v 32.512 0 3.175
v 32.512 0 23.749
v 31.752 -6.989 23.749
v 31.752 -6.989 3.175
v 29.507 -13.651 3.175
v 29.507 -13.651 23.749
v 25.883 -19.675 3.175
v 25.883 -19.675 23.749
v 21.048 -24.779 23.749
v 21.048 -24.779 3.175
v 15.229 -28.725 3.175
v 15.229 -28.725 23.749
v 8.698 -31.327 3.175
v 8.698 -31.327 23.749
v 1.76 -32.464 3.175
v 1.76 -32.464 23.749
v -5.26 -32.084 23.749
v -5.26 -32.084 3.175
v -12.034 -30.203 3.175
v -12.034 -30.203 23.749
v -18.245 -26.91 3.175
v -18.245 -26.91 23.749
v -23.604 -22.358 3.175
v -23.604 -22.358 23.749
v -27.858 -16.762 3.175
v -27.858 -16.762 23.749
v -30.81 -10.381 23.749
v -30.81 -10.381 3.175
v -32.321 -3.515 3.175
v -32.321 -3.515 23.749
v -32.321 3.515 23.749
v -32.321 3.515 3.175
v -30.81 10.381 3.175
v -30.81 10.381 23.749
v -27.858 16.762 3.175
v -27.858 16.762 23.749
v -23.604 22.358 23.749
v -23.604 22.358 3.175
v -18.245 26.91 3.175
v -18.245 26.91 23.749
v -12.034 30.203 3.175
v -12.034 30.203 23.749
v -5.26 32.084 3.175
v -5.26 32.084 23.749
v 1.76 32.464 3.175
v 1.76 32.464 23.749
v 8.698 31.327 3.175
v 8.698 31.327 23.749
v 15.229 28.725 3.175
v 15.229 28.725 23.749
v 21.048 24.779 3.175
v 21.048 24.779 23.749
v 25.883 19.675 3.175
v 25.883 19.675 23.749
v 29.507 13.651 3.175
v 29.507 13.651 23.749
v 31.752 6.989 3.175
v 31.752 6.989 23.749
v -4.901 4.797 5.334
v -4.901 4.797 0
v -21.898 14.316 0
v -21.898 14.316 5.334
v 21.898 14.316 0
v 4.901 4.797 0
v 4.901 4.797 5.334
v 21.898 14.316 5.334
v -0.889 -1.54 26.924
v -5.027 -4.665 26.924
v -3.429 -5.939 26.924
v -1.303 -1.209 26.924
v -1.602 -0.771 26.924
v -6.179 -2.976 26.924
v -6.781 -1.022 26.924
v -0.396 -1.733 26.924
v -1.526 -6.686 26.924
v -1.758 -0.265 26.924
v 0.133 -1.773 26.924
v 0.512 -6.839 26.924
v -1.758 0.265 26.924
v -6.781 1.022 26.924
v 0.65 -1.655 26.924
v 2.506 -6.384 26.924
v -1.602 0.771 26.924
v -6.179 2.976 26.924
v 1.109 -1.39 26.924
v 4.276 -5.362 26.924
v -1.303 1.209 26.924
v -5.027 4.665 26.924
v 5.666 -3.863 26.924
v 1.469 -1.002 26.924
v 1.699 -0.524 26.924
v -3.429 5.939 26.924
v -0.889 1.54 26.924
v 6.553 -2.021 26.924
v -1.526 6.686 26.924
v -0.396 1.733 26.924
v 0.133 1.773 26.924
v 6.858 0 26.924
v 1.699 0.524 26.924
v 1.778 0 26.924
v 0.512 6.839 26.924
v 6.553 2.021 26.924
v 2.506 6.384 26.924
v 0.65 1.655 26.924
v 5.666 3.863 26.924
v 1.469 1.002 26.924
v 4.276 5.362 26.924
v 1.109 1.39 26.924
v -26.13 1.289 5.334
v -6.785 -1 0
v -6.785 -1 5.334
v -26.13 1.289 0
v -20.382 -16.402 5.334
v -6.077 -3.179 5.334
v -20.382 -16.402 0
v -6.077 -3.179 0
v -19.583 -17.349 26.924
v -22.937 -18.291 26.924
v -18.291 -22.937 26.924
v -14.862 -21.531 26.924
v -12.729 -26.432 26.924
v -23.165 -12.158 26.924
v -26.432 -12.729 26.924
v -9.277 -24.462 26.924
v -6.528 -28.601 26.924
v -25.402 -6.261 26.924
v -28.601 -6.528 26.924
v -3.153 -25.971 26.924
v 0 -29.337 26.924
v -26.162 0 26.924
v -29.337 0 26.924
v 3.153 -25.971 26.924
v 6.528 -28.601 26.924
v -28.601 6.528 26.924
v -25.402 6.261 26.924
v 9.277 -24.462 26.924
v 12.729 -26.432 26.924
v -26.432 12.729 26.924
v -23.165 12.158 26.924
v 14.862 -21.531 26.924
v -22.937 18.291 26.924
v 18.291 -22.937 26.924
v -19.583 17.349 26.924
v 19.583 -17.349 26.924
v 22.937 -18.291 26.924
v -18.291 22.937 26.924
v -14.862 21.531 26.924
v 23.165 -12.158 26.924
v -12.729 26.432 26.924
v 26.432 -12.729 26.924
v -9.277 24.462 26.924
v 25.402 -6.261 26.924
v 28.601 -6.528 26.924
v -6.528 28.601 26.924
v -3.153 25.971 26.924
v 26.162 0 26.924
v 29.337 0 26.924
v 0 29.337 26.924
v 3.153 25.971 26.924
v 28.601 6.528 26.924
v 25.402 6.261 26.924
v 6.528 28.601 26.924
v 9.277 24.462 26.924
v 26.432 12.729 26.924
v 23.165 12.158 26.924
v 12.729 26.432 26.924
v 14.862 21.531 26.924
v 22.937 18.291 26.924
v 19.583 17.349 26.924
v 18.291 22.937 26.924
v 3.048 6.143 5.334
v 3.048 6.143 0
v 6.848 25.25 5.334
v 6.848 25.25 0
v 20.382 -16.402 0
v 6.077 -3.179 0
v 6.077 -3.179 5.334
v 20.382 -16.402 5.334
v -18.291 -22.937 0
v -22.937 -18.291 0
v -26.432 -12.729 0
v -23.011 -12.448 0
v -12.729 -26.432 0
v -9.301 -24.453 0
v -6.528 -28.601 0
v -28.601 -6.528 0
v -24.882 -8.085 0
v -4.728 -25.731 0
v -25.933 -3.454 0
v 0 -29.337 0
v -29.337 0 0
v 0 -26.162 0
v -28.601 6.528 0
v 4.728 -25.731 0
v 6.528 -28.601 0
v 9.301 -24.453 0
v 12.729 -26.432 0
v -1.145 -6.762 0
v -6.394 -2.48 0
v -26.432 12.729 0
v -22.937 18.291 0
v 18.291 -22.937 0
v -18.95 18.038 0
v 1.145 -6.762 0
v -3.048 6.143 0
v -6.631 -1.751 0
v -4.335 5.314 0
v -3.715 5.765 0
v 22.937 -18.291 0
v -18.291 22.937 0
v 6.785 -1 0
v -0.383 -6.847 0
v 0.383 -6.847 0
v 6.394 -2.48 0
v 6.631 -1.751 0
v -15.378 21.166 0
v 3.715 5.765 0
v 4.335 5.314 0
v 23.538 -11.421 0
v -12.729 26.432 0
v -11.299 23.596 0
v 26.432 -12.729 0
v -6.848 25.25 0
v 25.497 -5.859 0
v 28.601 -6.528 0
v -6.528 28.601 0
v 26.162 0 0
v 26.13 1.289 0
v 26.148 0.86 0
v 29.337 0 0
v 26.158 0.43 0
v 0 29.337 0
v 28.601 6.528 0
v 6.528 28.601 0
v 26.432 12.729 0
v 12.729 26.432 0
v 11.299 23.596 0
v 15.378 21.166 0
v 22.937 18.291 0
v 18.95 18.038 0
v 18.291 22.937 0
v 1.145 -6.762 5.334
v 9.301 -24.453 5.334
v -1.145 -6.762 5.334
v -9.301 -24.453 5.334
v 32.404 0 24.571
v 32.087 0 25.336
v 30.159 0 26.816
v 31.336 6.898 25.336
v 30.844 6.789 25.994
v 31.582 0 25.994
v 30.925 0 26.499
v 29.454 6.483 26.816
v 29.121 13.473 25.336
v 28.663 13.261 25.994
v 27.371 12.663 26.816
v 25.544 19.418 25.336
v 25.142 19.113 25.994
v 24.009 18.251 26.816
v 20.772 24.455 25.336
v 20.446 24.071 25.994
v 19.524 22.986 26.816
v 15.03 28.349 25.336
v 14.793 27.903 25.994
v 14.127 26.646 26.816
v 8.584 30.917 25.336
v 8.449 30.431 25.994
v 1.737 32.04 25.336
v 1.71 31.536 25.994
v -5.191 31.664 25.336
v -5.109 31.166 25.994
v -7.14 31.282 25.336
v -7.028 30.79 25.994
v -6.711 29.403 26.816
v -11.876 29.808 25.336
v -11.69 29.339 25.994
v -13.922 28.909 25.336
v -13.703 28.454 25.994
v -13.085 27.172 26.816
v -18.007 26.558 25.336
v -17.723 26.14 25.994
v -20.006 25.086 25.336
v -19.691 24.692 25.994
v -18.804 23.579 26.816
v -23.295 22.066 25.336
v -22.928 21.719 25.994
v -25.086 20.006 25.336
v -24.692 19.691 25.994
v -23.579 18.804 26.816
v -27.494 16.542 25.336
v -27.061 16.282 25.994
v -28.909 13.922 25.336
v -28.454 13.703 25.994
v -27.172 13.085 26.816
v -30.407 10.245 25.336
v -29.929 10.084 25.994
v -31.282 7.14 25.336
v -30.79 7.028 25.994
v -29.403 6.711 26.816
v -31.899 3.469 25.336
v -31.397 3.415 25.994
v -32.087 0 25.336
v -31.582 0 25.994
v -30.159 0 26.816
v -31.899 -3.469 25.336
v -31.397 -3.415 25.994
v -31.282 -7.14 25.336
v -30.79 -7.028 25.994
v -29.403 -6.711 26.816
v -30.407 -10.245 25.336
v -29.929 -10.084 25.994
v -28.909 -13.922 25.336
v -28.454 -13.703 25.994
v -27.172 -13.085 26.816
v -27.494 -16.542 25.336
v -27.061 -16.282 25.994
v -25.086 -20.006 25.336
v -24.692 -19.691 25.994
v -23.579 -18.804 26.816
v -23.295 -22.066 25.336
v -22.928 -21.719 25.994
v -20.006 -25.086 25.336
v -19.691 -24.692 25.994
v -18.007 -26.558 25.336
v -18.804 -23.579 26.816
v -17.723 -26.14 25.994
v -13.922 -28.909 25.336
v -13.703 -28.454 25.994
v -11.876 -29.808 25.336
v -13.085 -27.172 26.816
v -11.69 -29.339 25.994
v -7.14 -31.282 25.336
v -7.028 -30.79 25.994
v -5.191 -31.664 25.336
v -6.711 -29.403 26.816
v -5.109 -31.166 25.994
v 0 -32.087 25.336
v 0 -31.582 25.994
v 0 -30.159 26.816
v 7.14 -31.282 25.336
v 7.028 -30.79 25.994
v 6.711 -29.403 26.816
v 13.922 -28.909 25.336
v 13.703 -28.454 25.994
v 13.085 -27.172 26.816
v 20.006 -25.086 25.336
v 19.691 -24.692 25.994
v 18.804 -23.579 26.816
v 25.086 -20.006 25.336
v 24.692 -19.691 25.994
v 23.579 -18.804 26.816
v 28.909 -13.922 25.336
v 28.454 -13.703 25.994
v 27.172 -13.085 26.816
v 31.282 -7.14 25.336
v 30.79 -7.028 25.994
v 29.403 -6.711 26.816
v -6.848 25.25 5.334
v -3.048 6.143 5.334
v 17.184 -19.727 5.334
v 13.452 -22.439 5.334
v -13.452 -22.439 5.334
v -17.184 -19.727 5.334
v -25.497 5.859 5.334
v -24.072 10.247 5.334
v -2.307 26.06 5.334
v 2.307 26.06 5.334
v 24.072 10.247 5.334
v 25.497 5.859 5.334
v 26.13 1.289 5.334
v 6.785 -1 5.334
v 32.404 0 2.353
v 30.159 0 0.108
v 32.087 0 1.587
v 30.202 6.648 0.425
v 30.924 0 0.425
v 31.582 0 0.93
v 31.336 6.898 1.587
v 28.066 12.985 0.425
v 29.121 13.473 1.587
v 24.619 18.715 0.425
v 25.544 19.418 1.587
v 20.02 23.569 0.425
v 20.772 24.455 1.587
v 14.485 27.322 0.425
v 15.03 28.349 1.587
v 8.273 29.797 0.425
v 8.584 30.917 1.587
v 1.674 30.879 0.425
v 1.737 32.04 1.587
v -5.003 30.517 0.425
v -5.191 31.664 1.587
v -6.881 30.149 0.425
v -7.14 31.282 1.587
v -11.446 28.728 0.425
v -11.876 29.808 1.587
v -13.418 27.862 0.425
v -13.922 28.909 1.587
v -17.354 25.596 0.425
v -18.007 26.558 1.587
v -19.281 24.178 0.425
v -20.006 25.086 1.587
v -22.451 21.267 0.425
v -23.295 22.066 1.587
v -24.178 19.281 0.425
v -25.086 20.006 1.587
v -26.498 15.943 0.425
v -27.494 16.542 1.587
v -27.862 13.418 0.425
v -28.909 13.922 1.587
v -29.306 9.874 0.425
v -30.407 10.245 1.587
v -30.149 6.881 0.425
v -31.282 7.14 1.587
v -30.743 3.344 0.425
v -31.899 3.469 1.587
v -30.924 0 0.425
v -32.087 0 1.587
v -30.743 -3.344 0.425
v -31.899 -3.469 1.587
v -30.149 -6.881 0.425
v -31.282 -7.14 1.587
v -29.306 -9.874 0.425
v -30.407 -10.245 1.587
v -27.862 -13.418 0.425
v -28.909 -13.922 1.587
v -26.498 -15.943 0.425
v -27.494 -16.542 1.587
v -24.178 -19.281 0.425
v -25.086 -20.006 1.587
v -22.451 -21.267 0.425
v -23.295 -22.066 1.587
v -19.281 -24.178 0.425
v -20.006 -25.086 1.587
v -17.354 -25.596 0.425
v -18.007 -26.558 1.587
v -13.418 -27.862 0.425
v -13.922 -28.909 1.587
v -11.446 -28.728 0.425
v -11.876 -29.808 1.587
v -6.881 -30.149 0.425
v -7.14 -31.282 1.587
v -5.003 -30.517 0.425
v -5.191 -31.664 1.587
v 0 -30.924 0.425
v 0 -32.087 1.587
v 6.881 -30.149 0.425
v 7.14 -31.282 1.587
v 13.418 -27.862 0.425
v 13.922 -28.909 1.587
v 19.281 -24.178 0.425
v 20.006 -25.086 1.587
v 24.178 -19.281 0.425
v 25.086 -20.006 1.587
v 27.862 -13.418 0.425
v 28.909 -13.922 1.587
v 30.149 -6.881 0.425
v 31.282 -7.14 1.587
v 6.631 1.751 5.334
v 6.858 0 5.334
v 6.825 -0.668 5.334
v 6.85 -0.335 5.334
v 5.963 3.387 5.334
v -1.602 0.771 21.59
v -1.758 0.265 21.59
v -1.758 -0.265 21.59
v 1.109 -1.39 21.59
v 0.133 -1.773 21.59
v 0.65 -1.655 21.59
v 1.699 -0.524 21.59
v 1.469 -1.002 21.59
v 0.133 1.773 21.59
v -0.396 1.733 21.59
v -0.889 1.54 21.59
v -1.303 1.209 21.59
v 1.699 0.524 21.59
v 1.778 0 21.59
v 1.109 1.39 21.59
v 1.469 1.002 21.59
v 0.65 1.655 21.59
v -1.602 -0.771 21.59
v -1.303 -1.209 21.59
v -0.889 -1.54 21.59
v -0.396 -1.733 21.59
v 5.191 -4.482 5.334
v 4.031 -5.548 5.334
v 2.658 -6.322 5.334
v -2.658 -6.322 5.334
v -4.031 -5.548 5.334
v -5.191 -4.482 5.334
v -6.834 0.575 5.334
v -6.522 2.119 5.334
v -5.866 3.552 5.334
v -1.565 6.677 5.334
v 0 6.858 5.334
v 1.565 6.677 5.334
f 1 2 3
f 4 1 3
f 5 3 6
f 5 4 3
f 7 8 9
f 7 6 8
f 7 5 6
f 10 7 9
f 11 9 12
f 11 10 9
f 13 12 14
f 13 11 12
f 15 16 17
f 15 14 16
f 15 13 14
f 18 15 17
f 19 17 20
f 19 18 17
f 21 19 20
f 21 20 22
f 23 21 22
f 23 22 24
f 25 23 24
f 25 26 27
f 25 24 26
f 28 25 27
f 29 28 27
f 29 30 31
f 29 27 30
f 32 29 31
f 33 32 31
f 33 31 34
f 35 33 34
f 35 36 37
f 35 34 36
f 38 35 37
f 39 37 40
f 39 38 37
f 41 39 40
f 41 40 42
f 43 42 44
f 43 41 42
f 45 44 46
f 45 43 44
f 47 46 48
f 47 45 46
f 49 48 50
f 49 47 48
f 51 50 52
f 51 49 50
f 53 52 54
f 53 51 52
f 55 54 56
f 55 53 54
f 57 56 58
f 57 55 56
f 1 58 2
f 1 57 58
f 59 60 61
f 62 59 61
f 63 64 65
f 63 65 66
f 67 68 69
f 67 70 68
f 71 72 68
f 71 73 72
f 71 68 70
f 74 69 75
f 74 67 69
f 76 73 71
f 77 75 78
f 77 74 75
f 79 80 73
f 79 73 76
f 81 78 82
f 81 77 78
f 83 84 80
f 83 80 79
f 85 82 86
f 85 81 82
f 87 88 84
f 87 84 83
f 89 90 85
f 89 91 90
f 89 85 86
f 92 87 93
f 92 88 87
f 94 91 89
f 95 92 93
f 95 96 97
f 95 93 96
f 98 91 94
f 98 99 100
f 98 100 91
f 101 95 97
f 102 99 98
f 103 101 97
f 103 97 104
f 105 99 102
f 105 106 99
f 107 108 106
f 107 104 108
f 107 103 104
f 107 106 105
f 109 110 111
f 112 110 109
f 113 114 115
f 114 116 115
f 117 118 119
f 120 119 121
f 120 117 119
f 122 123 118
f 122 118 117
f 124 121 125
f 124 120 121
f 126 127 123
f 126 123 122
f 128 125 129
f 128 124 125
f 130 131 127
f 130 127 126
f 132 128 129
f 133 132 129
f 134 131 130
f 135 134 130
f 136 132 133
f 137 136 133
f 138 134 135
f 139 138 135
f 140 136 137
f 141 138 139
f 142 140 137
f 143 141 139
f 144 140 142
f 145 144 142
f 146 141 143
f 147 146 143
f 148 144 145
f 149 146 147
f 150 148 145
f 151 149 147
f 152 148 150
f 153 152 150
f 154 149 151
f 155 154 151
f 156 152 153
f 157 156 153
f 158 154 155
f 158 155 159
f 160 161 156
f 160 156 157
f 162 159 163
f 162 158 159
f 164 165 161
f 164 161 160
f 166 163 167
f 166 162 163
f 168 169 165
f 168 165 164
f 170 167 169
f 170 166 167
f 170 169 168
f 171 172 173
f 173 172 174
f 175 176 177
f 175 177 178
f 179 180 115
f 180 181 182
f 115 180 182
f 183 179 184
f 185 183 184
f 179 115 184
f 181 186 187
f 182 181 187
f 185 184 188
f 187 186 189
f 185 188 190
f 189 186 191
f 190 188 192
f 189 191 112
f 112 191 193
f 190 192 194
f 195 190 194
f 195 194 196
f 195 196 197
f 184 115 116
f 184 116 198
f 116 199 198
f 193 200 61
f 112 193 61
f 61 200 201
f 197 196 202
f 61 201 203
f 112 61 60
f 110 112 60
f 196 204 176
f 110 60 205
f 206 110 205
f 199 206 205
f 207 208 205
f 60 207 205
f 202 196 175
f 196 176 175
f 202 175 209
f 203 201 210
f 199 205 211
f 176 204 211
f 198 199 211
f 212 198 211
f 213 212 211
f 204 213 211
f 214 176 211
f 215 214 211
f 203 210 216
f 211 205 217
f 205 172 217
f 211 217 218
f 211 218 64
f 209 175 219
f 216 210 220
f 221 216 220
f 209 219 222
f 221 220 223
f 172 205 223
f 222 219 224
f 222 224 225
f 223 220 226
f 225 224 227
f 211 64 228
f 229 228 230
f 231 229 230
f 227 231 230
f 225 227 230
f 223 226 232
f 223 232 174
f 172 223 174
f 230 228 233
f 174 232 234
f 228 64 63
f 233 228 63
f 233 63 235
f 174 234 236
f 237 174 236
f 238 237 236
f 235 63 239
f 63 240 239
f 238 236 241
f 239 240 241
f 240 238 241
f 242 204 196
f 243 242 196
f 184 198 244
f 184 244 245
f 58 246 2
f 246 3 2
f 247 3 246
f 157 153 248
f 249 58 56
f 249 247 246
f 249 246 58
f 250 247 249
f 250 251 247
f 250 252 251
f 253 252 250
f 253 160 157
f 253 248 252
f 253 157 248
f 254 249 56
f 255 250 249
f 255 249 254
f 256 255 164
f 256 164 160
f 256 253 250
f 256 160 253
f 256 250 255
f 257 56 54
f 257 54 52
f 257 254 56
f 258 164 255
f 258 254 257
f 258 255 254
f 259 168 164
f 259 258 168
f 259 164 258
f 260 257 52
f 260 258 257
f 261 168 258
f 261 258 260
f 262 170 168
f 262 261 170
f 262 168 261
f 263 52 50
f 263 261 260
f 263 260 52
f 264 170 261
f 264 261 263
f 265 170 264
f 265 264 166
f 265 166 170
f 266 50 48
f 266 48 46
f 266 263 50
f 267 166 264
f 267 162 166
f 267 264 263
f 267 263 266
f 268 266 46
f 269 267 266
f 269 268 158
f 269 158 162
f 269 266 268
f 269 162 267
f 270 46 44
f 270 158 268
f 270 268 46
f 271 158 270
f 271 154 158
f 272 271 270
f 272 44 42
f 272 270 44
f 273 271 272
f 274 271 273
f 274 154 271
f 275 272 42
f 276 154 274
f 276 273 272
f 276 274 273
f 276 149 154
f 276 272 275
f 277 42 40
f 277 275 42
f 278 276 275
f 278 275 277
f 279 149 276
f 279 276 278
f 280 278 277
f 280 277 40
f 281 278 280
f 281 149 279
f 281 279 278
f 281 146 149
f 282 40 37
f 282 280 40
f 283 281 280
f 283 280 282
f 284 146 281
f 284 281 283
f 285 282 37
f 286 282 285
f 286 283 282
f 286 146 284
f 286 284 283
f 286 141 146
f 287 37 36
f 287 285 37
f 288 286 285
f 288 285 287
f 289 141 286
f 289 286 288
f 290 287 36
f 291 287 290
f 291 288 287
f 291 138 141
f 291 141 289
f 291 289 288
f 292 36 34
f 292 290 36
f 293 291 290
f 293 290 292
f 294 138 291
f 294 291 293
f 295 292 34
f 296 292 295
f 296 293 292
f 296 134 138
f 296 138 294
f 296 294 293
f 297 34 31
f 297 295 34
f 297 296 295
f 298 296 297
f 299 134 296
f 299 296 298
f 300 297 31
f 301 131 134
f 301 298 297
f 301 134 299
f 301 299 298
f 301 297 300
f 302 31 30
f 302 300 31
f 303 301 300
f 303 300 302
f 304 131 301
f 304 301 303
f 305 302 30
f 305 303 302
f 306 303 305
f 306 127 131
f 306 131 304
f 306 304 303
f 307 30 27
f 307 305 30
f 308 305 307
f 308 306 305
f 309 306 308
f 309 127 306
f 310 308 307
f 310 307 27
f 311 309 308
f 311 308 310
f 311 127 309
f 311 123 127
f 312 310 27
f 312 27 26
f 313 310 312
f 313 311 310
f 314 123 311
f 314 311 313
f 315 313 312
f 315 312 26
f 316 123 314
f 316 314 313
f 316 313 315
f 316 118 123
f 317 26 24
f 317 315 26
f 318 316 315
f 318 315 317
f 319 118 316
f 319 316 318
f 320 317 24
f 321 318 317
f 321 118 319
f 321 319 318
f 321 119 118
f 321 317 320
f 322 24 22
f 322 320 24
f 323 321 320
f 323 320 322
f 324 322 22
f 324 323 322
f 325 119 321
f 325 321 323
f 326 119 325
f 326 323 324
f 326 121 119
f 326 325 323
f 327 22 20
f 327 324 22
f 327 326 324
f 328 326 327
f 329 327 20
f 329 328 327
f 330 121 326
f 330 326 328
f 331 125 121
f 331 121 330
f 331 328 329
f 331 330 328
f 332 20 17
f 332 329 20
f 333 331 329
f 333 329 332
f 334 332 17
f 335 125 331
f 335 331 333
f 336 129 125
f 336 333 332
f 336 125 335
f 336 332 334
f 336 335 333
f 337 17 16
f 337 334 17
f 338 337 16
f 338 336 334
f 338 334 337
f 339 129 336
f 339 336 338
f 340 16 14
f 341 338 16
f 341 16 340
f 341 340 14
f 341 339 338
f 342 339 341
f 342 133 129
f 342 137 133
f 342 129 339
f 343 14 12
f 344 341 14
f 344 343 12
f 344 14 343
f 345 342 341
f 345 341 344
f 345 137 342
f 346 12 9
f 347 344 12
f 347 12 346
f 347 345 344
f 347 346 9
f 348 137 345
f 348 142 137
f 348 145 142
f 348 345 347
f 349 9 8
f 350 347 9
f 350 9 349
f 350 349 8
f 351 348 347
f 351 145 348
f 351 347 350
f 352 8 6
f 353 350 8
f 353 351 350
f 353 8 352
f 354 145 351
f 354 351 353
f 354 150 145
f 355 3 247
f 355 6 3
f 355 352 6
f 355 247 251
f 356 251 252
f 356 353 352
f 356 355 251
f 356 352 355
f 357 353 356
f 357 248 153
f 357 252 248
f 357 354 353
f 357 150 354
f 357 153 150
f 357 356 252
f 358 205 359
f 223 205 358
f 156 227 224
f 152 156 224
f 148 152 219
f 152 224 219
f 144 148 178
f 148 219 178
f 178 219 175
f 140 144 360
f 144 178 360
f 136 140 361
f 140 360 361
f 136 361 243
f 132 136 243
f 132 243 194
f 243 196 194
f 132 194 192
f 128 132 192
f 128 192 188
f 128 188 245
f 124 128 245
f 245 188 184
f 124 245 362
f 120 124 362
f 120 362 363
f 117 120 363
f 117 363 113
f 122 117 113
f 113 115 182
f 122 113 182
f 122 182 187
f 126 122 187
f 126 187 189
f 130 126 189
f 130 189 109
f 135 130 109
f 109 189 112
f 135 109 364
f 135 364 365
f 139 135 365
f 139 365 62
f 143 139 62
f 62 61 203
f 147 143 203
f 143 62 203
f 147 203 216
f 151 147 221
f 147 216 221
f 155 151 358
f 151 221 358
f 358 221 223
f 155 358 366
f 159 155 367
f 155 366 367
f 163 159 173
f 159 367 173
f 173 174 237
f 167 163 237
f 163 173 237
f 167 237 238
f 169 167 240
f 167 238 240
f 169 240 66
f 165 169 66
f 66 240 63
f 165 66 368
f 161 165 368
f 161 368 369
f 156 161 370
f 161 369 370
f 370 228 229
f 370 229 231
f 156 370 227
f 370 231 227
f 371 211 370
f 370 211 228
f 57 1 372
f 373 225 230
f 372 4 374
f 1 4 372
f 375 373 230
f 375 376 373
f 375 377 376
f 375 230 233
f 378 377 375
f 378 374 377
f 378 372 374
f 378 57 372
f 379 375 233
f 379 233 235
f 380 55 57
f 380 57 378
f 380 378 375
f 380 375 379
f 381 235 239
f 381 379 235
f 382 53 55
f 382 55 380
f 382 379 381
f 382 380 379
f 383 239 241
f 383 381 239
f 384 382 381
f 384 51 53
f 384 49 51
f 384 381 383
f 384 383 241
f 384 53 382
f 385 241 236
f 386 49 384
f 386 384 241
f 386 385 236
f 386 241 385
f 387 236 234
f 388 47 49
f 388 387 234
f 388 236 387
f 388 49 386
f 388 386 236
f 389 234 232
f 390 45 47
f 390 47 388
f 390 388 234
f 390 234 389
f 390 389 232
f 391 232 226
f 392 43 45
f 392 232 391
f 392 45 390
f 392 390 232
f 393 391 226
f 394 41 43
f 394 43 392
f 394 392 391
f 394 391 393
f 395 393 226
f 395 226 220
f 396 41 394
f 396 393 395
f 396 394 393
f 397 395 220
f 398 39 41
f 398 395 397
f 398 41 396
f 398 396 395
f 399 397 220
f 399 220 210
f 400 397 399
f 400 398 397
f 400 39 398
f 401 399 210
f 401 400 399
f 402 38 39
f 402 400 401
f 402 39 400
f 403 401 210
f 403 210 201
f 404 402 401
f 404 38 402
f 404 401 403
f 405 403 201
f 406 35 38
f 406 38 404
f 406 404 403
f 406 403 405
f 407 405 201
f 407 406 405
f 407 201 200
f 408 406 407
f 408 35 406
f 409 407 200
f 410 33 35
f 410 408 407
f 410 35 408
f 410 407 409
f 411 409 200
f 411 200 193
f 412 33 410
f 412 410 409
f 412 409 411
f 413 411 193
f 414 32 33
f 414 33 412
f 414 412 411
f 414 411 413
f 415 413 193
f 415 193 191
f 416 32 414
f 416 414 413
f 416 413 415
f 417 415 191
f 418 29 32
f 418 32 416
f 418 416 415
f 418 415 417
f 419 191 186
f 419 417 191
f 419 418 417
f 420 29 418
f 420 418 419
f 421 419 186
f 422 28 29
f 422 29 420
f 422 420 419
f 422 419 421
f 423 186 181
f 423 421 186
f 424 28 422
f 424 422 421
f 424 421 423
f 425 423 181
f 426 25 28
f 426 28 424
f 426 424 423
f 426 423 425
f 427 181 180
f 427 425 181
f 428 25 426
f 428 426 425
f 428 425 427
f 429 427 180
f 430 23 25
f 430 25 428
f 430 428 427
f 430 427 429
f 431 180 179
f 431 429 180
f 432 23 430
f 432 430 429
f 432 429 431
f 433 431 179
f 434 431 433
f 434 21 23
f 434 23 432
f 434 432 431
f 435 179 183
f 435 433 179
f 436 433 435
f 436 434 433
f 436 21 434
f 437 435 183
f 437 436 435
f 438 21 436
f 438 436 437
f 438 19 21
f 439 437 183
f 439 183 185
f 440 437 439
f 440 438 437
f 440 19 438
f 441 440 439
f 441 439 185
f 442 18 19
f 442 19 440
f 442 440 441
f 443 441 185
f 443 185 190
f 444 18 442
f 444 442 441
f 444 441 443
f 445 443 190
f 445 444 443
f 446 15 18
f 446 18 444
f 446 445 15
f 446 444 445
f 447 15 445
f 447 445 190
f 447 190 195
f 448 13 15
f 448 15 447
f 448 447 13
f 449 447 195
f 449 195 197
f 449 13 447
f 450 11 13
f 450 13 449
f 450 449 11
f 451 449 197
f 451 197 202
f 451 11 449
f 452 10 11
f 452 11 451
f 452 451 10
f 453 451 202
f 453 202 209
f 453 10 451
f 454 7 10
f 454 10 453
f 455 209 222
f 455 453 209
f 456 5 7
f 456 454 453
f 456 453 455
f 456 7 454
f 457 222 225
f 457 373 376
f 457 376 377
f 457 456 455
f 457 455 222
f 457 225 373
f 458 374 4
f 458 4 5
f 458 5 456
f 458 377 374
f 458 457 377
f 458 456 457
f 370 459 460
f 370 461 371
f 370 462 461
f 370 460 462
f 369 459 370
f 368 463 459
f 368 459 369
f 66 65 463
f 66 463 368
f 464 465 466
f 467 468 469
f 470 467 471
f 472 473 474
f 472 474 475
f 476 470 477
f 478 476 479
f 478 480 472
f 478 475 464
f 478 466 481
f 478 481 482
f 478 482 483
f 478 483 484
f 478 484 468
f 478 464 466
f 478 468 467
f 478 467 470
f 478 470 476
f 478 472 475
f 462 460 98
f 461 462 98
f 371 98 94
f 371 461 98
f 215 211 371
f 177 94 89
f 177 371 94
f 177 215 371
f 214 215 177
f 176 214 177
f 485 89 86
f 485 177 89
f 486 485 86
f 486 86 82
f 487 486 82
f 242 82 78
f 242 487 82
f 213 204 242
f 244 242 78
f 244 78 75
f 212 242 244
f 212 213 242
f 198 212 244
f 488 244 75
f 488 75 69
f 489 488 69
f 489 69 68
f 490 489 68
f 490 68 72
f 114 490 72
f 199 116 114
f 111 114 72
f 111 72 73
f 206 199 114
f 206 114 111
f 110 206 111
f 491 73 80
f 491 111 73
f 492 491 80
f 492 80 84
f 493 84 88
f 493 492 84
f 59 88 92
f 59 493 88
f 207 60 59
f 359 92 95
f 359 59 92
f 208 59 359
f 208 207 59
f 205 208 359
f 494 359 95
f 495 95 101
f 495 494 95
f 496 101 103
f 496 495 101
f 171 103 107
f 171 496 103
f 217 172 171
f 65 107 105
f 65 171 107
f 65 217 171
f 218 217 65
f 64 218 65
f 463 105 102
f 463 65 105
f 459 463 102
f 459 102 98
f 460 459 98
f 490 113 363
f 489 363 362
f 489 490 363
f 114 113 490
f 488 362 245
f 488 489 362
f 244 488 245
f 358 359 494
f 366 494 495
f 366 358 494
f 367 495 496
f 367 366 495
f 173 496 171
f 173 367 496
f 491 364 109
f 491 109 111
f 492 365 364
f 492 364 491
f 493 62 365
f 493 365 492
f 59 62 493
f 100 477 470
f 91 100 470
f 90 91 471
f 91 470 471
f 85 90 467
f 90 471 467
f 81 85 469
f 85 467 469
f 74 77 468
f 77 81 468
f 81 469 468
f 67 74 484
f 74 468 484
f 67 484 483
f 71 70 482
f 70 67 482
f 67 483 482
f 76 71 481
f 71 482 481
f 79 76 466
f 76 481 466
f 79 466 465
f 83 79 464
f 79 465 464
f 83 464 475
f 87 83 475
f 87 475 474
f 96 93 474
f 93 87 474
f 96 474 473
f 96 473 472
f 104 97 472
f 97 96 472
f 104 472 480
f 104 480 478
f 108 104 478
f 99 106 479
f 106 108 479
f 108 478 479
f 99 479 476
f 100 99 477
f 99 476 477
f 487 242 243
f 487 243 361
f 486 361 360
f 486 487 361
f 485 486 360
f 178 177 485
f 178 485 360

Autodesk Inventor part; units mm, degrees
ref_plane "YZ Plane" through (0, 0, 0) normal (1, 0, 0) x (0, 1, 0)
ref_plane "XZ Plane" through (0, 0, 0) normal (0, 1, 0) x (-1, 0, 0)
ref_plane "XY Plane" through (0, 0, 0) normal (0, 0, 1) x (1, 0, 0)
sketch "Sketch1" plane through (0, 0, 0) normal (0, 0, 1) x (1, 0, 0)
  circle A0 centre (0, 0) radius 1.778
  circle A1 centre (0, 0) radius 32.512
  circle A2 centre (0, 0) radius 26.162
  circle A3 centre (0, 0) radius 6.858
  line L0 (-3.048, 6.1434) -> (-6.8485, 25.2497)
  line L1 (3.048, 6.1434) -> (6.8485, 25.2497)
  arc A4 (6.8485, 25.2497) -> (-6.8485, 25.2497) centre (0, 0) ccw construction
  line L2 (-6.7846, -1.0004) -> (-26.1302, 1.2893)
  circle A5 centre (0, 0) radius 26.162
  line L3 (-4.9009, 4.7972) -> (-21.8976, 14.3159)
  circle A6 centre (0, 0) radius 6.858
  line L4 (-1.1451, -6.7617) -> (-9.3009, -24.4529)
  circle A7 centre (0, 0) radius 26.162
  line L5 (-6.0769, -3.1786) -> (-20.3819, -16.402)
  circle A8 centre (0, 0) radius 6.858
  line L6 (6.0769, -3.1786) -> (20.3819, -16.402)
  circle A9 centre (0, 0) radius 26.162
  line L7 (1.1451, -6.7617) -> (9.3009, -24.4529)
  circle A10 centre (0, 0) radius 6.858
  line L8 (4.9009, 4.7972) -> (21.8976, 14.3159)
  circle A11 centre (0, 0) radius 26.162
  line L9 (6.7846, -1.0004) -> (26.1302, 1.2893)
  circle A12 centre (0, 0) radius 6.858
  dimension "d1" = 65.024
  dimension "d2" = 3.556
  dimension "d3" = 13.716
  dimension "d4" = 6.35
  dimension "d5" = 22.5
  dimension "d7" = 3.048
  dimension "d10" = 360
extrude "Extrusion1" add sketch "Sketch1" along normal blind 26.924 contours A1 | A3
extrude "Extrusion2" add sketch "Sketch1" along normal blind 21.59 contours A0
extrude "Extrusion3" add sketch "Sketch1" along normal blind 5.334 contours L9 A3 L8 A2 | A2 L7 A3 L6 | L1 A3 L0 A2 | A2 L5 A3 L4 | L3 A3 L2 A2
fillet "Fillet1" radius 3.175 2 edges at (-32.512, 0, 26.924) (-32.512, 0, 0)
properties part number "OGWheel" material "ABS Plastic"
